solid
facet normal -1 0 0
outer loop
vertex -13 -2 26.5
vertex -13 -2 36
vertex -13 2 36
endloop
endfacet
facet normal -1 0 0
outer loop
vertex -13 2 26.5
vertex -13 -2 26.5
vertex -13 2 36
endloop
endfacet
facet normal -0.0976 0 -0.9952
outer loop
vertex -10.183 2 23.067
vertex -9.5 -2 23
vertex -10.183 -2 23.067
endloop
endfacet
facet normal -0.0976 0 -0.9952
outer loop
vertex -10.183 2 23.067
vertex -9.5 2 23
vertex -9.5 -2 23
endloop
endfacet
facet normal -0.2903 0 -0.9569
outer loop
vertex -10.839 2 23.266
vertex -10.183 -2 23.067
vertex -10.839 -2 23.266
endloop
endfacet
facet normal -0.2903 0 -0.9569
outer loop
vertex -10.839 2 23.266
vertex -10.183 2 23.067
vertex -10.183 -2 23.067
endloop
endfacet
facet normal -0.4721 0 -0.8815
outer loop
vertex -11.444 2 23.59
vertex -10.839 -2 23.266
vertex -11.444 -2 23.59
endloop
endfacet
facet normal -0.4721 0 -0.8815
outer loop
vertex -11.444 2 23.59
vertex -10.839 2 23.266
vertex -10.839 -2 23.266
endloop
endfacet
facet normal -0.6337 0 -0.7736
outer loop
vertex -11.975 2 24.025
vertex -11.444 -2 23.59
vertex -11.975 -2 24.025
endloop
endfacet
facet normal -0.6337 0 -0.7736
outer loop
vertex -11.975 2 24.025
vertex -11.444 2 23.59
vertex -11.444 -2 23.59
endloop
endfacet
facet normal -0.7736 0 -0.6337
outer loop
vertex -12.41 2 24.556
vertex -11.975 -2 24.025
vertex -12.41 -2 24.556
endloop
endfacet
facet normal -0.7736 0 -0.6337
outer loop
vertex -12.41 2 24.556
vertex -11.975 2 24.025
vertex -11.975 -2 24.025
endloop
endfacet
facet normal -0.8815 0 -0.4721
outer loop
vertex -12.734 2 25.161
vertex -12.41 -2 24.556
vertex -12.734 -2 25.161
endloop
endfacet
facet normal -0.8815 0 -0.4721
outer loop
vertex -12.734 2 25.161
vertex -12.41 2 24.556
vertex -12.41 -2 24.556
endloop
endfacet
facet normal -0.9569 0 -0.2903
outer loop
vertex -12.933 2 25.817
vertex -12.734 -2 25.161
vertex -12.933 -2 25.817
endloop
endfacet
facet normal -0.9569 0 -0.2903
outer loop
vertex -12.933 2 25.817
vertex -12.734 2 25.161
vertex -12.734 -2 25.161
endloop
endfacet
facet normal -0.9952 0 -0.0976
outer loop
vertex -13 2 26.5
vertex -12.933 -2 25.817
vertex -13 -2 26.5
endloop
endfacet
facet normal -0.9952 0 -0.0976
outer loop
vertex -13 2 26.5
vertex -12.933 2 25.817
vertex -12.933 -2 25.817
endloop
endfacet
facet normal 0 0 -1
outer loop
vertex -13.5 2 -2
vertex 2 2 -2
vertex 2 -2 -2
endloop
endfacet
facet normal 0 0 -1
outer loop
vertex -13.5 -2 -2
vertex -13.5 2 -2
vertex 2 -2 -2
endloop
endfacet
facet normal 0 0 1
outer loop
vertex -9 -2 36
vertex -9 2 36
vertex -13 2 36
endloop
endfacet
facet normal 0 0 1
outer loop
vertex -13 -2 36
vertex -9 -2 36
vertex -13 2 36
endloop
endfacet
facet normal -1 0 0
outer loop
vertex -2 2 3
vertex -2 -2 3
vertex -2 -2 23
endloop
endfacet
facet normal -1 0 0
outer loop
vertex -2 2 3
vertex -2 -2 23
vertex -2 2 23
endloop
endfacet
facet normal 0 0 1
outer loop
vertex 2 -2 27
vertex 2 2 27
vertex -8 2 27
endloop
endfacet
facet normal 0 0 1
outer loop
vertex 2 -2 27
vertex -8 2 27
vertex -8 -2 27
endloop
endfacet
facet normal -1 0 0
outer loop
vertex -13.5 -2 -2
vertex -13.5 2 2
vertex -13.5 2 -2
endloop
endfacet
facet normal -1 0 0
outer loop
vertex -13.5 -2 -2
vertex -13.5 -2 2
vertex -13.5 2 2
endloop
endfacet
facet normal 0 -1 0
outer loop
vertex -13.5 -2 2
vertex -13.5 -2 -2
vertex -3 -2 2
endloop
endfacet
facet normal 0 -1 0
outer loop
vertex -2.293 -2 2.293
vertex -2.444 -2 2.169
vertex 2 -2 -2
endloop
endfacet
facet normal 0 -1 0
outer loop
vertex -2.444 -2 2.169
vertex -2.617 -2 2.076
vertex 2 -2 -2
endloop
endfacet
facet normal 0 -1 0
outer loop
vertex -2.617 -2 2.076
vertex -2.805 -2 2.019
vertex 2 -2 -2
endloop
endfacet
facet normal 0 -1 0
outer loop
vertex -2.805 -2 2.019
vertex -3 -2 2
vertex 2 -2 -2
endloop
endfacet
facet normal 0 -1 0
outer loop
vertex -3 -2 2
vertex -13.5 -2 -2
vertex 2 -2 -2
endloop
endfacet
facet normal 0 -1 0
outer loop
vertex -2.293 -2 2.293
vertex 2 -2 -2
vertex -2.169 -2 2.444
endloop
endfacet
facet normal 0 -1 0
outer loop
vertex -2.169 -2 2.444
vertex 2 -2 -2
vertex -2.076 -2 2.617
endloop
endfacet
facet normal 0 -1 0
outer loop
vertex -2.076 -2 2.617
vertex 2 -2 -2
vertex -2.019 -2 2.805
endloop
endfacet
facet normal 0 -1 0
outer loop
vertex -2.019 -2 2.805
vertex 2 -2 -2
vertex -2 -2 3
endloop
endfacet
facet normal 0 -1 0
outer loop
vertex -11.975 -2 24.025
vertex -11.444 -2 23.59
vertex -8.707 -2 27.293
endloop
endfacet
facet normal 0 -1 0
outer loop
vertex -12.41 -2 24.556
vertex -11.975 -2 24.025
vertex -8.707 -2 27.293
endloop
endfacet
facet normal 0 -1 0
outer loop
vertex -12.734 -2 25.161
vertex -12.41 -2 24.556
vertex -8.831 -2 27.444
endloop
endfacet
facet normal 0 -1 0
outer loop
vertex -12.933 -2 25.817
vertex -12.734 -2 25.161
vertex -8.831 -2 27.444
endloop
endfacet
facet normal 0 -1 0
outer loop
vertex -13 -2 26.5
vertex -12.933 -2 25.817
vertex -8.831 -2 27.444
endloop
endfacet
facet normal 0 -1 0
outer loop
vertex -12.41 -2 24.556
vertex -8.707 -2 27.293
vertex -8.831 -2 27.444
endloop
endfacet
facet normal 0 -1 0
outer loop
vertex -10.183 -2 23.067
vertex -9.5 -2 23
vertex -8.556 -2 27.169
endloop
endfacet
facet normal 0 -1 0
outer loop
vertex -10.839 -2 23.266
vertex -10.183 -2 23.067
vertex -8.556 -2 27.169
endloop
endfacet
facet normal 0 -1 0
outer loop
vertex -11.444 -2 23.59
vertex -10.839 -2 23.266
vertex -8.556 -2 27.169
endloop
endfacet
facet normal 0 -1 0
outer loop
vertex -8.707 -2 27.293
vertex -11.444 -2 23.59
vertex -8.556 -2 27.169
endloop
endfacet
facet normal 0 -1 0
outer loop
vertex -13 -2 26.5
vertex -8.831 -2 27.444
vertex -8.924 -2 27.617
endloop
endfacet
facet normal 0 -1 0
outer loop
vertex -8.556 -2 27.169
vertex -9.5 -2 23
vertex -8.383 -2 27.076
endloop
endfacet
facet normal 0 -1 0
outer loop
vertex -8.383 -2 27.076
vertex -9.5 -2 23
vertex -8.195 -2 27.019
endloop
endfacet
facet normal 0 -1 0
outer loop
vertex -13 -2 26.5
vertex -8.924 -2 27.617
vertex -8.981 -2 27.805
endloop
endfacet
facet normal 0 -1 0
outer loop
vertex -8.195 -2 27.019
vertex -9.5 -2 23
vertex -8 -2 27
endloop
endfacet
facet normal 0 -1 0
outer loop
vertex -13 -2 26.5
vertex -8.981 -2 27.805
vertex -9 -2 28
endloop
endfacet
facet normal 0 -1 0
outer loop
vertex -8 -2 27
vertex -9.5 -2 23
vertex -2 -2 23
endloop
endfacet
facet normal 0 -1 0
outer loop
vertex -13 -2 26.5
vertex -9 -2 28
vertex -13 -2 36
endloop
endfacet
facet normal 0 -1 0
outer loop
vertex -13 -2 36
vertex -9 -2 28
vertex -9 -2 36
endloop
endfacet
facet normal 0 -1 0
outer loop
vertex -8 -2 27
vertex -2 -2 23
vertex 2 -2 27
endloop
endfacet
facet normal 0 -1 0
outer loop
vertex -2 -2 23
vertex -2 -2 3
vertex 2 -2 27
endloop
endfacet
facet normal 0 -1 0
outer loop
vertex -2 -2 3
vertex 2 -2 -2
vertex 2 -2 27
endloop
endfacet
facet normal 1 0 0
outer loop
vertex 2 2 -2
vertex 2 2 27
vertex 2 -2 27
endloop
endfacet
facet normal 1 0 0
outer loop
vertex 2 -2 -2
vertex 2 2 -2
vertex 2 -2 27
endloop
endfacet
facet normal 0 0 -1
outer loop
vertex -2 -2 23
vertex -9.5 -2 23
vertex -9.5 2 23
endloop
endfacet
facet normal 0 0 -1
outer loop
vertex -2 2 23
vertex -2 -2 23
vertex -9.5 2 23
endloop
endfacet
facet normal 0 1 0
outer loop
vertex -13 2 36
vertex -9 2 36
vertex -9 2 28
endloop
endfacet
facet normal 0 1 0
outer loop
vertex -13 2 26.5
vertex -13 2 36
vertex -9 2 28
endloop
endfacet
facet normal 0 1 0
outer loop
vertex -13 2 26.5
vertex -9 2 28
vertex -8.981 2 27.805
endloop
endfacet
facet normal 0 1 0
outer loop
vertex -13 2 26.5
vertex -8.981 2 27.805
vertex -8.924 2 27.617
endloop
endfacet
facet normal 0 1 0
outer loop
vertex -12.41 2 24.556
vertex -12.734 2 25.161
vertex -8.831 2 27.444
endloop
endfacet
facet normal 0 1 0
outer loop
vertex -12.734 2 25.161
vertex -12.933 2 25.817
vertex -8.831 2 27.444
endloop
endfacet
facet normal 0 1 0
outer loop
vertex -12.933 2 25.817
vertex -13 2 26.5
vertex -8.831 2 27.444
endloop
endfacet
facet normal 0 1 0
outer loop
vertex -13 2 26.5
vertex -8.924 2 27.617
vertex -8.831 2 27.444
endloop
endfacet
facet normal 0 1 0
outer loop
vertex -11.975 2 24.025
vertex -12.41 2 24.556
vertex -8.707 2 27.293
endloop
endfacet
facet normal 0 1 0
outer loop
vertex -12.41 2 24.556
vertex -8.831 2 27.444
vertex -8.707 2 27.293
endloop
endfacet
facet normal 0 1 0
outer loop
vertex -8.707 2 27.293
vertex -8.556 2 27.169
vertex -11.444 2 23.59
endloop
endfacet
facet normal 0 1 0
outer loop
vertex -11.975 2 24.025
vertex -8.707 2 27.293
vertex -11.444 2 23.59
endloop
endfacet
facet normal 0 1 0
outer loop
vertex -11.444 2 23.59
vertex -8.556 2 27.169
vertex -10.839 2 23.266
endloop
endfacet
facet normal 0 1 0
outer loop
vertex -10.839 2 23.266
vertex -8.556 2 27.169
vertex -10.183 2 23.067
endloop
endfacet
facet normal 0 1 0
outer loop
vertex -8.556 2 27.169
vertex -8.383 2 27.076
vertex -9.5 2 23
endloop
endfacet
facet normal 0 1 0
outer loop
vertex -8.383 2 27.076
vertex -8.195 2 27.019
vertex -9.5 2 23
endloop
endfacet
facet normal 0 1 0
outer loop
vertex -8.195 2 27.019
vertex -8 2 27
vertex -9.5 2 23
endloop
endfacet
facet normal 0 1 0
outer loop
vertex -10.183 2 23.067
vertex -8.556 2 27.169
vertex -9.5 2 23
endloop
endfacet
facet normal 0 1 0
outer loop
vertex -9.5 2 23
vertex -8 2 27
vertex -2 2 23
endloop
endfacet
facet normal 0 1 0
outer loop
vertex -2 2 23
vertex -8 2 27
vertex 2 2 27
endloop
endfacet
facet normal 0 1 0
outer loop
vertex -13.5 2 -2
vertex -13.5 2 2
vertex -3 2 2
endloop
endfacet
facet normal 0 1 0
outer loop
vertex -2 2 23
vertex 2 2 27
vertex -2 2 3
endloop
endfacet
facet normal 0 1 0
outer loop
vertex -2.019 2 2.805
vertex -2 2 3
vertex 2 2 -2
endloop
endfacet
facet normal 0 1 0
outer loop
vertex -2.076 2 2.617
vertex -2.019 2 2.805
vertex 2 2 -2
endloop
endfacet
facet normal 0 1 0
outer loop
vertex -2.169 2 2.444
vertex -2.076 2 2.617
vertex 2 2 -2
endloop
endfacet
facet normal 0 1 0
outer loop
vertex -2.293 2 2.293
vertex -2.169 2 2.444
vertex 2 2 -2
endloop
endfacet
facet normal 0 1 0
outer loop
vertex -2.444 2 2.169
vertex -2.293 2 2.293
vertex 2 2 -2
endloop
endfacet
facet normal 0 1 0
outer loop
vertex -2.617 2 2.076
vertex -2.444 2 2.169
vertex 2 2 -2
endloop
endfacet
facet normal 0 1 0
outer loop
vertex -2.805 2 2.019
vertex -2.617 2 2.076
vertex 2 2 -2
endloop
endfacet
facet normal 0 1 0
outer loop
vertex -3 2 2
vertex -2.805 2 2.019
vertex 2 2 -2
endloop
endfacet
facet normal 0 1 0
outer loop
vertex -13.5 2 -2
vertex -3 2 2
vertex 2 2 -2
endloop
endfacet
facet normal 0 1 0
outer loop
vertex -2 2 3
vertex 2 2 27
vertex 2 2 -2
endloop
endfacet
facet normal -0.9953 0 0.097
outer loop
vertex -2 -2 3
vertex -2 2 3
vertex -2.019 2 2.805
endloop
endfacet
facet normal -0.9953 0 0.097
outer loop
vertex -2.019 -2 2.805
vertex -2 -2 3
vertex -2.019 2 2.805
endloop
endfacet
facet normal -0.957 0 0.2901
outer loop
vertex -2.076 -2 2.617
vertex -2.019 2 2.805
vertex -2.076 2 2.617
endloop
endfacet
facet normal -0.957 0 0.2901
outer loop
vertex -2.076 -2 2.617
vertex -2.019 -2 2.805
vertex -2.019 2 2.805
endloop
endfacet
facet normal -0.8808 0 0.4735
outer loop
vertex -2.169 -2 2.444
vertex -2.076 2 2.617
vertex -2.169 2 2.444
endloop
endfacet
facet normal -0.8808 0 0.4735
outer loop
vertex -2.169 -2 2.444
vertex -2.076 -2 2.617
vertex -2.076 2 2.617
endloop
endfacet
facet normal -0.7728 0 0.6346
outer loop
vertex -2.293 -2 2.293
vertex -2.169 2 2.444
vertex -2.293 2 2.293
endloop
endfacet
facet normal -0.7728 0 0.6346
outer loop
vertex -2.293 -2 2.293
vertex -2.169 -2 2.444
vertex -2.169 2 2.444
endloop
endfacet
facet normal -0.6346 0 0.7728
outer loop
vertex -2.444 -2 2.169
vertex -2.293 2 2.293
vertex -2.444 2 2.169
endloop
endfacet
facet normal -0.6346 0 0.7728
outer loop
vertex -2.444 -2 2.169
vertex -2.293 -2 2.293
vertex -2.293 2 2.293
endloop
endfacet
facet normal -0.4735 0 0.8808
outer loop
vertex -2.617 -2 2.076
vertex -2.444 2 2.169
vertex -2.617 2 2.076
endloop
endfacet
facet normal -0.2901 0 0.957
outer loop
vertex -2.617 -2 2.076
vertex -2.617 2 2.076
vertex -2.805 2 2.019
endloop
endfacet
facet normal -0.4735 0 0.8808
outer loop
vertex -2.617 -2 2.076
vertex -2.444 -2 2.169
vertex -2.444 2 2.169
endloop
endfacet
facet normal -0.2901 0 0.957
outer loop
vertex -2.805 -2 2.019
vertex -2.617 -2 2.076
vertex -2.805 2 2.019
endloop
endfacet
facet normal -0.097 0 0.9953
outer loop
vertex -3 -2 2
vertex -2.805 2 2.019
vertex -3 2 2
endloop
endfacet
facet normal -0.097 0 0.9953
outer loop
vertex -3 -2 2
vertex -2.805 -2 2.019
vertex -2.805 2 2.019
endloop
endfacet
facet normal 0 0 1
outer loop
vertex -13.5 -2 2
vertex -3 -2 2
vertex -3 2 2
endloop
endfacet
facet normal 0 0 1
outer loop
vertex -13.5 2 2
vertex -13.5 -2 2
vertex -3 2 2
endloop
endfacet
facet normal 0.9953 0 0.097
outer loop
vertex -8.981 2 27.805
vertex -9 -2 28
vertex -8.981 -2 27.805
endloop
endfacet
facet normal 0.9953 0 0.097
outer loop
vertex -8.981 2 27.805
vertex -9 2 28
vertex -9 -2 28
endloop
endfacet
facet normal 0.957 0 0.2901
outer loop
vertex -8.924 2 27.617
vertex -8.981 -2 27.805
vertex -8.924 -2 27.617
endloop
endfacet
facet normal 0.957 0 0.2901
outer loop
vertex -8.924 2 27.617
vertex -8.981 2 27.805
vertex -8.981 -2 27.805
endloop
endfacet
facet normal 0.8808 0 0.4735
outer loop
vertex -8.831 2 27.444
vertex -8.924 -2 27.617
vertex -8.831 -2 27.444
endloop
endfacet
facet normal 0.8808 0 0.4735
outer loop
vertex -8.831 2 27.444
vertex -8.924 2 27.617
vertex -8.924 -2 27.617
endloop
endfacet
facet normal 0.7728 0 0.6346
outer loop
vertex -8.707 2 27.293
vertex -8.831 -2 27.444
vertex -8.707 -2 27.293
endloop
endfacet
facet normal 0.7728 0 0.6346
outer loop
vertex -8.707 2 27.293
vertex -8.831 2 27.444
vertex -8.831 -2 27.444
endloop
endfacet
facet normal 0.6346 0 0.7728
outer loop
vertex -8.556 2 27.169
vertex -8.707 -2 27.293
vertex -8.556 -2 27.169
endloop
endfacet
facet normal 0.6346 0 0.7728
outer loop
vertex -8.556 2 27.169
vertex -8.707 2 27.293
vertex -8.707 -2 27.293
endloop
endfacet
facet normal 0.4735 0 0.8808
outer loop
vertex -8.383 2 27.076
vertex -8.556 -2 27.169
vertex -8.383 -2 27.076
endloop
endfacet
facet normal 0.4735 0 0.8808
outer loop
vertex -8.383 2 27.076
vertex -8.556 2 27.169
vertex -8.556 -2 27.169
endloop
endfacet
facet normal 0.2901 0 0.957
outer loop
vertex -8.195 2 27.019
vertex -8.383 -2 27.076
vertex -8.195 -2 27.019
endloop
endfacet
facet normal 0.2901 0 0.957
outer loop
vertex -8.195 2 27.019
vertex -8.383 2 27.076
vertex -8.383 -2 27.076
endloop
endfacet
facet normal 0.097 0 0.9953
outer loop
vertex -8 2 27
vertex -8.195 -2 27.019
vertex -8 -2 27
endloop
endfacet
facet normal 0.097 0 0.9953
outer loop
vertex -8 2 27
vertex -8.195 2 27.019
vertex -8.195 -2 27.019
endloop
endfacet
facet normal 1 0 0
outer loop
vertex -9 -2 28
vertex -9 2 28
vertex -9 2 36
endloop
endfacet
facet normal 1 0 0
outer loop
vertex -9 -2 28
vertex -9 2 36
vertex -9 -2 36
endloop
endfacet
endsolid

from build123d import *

# Parameters (mm, degrees)
F2_W = 4
F2_H = 4
F4_R = 3.5
F5_R = 1


with BuildPart() as f3:
    # F3: sweep along a path in F0
    with BuildLine(Plane.XZ) as f3_path:
        Line((-13.5, 0), (0, 0))
        Line((0, 0), (0, 25))
        Line((0, 25), (-11, 25))
        Line((-11, 25), (-11, 36))
    # F2 (on line) → F3 (sweep)
    with BuildSketch(Plane(origin=(-13.5, 0, 0), x_dir=(0, -1, 0), z_dir=(-1, 0, 0))):
        Rectangle(F2_W, F2_H)
    sweep(path=f3_path.line, transition=Transition.RIGHT)

    # F4
    f4_edges = [f3.edges().sort_by_distance(p)[0] for p in [
        (-13, 0, 23),
    ]]
    fillet(f4_edges, radius=F4_R)

    # F5
    f5_edges = [f3.edges().sort_by_distance(p)[0] for p in [
        (-9, 0, 27),
        (-2, 0, 2),
    ]]
    fillet(f5_edges, radius=F5_R)


solid = f3.part
